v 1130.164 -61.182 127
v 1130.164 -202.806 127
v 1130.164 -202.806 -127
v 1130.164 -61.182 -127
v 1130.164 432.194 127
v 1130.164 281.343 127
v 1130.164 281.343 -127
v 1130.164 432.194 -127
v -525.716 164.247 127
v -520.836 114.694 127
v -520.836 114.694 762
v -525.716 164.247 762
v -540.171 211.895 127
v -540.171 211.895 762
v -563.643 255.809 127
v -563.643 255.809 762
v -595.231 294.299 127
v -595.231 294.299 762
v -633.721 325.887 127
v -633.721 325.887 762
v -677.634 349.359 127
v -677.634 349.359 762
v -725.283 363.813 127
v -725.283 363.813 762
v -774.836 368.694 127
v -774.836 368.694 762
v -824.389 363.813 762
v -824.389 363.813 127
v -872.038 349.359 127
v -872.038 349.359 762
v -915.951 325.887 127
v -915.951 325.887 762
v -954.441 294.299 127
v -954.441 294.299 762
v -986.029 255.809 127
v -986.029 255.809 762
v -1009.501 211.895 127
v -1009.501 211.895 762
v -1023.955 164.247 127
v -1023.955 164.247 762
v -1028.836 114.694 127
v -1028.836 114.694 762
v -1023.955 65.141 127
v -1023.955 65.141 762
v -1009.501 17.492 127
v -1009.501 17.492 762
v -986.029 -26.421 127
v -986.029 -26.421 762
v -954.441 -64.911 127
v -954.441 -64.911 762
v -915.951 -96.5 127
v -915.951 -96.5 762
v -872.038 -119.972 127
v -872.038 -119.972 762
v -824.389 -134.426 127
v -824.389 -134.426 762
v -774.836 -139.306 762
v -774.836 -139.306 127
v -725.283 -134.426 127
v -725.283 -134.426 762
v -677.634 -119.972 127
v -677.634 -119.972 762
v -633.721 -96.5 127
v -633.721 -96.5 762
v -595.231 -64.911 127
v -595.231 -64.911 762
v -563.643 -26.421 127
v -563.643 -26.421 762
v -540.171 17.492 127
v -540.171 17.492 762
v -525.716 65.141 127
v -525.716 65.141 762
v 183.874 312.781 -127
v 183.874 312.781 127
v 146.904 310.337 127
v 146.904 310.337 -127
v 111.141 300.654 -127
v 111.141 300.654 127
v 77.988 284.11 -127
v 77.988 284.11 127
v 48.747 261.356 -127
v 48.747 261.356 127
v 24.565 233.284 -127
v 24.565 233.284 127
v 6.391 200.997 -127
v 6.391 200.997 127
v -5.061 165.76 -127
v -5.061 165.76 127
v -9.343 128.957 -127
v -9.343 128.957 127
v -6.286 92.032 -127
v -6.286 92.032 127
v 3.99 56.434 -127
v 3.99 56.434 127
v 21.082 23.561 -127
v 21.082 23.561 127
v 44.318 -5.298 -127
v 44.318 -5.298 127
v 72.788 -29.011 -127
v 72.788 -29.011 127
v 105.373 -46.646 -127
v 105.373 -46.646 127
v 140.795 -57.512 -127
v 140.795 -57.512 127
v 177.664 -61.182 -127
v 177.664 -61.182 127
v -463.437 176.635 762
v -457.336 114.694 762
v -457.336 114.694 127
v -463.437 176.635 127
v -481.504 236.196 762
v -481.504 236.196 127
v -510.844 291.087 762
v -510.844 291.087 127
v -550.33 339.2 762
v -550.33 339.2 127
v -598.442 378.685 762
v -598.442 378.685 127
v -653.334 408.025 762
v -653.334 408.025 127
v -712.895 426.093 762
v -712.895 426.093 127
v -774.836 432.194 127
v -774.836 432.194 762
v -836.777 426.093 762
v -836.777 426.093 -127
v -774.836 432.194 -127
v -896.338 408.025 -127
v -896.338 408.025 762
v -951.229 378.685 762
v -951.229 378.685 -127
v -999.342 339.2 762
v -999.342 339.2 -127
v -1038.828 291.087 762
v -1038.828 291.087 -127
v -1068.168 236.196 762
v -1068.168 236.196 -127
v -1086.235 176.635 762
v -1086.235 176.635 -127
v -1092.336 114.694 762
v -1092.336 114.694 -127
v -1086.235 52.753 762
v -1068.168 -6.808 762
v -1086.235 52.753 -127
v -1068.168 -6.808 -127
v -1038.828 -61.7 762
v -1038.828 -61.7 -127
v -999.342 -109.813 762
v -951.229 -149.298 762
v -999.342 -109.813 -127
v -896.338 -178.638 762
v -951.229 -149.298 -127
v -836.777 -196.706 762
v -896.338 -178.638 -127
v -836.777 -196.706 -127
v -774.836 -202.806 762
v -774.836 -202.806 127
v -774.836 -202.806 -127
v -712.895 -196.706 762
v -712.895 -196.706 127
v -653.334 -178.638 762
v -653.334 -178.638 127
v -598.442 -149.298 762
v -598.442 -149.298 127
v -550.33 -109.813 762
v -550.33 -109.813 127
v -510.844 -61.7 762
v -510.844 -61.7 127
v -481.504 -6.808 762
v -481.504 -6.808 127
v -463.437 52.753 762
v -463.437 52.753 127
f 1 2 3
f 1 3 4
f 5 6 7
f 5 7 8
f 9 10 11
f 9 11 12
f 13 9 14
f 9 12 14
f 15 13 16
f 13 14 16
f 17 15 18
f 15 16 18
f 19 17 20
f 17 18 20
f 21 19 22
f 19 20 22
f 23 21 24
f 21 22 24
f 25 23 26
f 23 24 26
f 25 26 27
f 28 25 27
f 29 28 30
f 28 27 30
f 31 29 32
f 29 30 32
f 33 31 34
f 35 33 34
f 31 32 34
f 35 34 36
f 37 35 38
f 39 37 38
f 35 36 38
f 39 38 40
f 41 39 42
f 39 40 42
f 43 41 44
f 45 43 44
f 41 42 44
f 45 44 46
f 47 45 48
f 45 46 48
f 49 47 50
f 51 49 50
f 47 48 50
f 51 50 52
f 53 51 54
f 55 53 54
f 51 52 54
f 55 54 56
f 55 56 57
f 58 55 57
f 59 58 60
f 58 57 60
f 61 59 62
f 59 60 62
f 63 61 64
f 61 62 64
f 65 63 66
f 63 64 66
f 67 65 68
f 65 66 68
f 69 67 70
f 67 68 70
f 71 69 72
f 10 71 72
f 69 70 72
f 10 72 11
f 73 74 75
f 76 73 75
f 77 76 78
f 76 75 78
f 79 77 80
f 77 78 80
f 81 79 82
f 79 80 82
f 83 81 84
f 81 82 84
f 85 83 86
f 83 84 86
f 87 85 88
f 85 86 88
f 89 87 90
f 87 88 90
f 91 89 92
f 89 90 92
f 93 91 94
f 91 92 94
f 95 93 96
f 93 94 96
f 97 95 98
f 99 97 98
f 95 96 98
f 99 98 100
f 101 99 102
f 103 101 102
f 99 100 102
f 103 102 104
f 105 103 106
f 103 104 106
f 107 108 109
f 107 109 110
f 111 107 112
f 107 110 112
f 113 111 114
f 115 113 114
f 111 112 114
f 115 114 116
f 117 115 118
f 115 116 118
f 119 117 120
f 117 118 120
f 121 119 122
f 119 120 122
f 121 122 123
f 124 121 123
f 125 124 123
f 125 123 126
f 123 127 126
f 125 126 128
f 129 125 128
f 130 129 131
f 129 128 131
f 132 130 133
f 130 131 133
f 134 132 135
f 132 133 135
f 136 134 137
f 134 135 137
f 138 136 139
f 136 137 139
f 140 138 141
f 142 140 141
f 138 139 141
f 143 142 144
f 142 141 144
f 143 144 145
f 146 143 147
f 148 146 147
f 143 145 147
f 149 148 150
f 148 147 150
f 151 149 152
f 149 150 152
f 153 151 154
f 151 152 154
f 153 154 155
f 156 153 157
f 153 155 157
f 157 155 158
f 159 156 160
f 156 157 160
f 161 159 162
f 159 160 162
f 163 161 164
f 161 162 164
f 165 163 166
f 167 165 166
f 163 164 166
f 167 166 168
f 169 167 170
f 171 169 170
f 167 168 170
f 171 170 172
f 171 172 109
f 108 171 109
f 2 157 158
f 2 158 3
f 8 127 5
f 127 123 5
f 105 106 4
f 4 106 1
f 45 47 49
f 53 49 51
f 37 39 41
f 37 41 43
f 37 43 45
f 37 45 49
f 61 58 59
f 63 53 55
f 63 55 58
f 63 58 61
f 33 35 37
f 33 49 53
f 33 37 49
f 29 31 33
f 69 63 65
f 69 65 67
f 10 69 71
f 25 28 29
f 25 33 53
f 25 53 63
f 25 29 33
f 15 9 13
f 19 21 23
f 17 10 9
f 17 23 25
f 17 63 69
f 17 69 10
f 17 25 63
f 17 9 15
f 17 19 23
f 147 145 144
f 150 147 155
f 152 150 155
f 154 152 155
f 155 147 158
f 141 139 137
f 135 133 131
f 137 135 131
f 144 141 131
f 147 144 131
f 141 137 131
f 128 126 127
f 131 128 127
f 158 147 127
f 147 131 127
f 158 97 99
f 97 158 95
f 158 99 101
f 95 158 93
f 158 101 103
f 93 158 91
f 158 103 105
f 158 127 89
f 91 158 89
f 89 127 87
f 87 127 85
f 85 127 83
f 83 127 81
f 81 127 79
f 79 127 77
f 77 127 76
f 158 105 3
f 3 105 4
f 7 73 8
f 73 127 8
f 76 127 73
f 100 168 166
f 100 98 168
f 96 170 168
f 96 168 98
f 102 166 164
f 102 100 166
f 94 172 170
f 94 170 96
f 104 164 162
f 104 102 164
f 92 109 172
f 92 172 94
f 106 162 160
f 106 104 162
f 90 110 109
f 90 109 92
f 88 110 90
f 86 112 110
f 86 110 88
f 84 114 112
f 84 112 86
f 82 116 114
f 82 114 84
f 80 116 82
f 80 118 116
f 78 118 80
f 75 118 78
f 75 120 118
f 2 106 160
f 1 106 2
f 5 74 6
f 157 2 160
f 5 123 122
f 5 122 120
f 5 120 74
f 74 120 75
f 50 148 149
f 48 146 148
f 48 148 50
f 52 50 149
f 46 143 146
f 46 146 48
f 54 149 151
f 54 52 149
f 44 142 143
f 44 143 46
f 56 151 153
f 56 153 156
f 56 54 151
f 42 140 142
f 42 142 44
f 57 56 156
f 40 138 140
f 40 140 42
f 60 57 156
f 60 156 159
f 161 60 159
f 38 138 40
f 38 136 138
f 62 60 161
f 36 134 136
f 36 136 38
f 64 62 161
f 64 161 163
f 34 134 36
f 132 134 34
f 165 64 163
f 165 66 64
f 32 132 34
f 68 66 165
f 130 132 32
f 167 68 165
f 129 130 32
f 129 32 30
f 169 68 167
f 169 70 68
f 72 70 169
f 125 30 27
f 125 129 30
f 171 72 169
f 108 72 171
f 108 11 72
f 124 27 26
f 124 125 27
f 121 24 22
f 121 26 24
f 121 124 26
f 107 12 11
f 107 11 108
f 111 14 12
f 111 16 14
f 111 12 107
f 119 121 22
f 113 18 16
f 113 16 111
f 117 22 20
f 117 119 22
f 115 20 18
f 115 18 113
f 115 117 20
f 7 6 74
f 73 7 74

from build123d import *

# Parameters (mm, degrees)
F0_W     = 1905
F0_H     = 635
F1_DEPTH = 127
F2_R     = 317.5
F3_DEPTH = 127
F4_DEPTH = 127
F5_DEPTH = 508
F6_R     = 254
F7_DEPTH = 635
F9_DEPTH = 254.001


with BuildPart() as f1:
    # F0 (on Top) → F1 (new body, symmetric)
    with BuildSketch(Plane.XY):
        with Locations((177.6640671305, 114.6936982827)):
            Rectangle(F0_W, F0_H)
    extrude(amount=F1_DEPTH, both=True)

    # F2 (on face) → F3 (join, symmetric)
    with BuildSketch(Plane.XY.offset(127)):
        with Locations((-774.8359328695, 114.6936982827)):
            Circle(F2_R)
    extrude(amount=F3_DEPTH, both=True)

    # F4 (add): a face of the model
    f4_faces = [f1.faces().sort_by_distance(p)[0] for p in [
        (-909.5871180206, 114.6936982827, 0),
    ]]
    extrude(f4_faces, amount=F4_DEPTH)

    # F5 (add): a face of the model
    f5_faces = [f1.faces().sort_by_distance(p)[0] for p in [
        (-774.8359328695, 114.6936982827, 254),
    ]]
    extrude(f5_faces, amount=F5_DEPTH)

    # F6 (on face) → F7 (cut)
    with BuildSketch(Plane.XY.offset(762)):
        with Locations((-774.8359328695, 114.6936982827)):
            Circle(F6_R)
    extrude(amount=-F7_DEPTH, mode=Mode.SUBTRACT)

    # F8 (on face) → F9 (cut, through all)
    with BuildSketch(Plane.XY.offset(127)):
        with BuildLine():
            Line((1130.1640671305, 281.3425958157), (183.8743803286, 312.780909445))
            ThreePointArc((183.8743803286, 312.780909445), (-9.3430063716, 128.9567688771), (177.6640671305, -61.1816744713))
            Line((177.6640671305, -61.1816744713), (1130.1640671305, -61.1816744713))
            Line((1130.1640671305, -61.1816744713), (1130.1640671305, 281.3425958157))
        make_face()
    extrude(amount=-F9_DEPTH, mode=Mode.SUBTRACT)


solid = f1.part
